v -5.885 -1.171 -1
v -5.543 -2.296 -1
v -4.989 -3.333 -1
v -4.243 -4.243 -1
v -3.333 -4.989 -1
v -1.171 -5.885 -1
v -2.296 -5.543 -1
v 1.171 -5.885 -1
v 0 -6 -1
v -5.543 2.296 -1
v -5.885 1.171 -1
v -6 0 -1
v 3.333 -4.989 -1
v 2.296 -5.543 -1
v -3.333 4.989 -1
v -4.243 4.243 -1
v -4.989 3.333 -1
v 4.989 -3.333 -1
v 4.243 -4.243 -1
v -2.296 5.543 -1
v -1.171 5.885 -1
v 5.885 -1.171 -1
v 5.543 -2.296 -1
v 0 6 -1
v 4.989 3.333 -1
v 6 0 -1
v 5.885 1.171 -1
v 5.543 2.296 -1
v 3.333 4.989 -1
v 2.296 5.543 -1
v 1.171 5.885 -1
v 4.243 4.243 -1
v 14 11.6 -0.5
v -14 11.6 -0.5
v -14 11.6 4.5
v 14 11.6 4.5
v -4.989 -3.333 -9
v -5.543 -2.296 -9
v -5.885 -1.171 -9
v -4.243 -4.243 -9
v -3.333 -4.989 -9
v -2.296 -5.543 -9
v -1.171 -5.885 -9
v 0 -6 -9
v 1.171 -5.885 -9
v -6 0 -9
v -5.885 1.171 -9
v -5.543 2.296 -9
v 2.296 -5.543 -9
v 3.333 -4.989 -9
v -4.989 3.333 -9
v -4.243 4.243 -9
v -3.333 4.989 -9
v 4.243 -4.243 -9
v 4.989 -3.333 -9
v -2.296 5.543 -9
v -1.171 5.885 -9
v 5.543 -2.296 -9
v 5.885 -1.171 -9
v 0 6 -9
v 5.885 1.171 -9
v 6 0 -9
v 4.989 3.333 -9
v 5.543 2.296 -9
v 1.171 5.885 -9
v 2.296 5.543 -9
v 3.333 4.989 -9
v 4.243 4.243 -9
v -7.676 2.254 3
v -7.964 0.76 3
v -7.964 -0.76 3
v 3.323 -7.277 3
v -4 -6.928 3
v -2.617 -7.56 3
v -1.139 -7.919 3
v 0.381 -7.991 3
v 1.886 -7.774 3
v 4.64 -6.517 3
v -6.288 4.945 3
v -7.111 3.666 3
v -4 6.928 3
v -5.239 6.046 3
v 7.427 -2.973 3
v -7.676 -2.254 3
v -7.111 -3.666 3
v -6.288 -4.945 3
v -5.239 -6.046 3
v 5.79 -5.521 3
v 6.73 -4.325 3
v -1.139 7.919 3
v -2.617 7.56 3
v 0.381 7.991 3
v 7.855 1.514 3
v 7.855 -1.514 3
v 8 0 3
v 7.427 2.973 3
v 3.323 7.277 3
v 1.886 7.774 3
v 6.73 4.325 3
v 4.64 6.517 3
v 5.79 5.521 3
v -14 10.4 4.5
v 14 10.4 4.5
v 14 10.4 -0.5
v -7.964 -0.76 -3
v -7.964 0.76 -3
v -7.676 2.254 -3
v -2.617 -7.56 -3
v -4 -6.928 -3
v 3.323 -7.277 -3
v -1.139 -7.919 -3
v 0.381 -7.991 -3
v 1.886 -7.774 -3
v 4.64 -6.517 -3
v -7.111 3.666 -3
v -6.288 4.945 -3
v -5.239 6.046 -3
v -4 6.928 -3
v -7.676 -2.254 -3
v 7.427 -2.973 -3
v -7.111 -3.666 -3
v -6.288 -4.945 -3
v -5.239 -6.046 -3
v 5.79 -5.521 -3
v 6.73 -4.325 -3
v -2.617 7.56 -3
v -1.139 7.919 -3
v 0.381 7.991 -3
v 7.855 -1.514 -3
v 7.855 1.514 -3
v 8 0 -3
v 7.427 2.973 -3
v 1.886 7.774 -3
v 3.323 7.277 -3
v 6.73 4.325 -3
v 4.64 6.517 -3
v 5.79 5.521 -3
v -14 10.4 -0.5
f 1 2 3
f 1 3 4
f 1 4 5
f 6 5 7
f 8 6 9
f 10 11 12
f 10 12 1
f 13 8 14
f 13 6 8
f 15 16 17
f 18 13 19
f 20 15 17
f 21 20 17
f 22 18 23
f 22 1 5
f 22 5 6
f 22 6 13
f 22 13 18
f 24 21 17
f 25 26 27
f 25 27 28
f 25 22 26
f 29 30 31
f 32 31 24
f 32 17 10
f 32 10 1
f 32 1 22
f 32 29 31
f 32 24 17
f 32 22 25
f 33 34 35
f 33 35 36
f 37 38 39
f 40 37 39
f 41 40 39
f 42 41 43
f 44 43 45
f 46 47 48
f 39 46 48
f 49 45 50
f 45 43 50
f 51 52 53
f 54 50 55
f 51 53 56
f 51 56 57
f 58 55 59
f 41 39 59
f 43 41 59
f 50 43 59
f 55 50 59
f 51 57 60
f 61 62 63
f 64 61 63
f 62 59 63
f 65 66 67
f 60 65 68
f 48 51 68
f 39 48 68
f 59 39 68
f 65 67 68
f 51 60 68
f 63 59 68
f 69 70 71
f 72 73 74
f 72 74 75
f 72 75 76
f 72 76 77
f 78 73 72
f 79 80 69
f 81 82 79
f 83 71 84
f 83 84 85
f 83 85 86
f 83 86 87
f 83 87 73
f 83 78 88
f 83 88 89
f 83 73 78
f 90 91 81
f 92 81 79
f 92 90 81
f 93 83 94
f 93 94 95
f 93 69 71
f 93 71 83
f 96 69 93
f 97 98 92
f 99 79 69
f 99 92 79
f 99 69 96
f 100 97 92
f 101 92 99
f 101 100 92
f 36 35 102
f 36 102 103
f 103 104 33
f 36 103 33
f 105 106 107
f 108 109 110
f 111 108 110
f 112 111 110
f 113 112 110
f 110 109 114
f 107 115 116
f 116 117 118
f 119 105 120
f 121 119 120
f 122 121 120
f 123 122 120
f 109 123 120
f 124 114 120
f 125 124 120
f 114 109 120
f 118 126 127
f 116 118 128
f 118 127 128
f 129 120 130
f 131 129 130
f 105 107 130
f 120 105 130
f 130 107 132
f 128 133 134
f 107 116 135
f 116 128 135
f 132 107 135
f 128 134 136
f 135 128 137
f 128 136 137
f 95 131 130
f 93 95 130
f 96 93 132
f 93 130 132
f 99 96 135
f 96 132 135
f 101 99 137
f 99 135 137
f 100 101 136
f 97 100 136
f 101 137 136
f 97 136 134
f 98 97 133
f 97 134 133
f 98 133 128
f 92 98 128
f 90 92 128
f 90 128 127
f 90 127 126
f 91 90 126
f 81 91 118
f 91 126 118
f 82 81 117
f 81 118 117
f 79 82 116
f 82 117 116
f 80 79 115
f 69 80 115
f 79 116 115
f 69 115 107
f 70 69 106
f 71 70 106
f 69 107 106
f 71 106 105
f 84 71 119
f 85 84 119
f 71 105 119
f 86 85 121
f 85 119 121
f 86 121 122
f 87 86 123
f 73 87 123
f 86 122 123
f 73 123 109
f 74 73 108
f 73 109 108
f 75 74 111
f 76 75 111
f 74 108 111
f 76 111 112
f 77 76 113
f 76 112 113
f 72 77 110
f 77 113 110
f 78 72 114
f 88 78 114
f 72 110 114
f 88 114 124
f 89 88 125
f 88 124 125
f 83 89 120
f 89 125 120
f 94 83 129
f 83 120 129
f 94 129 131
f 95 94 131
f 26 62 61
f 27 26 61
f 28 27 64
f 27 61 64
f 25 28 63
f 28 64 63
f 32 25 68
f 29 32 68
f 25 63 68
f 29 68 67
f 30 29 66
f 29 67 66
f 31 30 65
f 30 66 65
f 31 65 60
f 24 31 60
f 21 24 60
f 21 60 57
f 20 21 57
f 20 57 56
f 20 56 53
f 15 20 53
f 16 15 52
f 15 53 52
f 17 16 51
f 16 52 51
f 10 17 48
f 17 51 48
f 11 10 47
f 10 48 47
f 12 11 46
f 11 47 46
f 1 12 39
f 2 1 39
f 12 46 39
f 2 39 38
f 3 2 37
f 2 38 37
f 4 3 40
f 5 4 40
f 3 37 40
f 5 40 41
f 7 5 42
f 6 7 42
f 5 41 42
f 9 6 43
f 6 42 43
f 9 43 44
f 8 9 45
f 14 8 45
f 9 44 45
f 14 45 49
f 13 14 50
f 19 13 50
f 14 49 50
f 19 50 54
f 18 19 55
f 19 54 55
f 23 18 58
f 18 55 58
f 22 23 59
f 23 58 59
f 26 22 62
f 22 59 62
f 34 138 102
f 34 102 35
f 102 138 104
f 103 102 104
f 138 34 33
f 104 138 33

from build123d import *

# Parameters (mm, degrees)
TOP_START                                  = -3
SKETCH_1_R                                 = 8
TOP_WAKE_BUTTON_CAP_DIA_16_MM_DEPTH        = 6
BUTTON_START                               = -9
SKETCH_2_R                                 = 6
BUTTON_THREADED_BODY_HOLE_MARKER_DIA_DEPTH = 8
BUTTON_START_2                             = -0.5
SKETCH_3_W                                 = 28
SKETCH_3_H                                 = 1.2
BUTTON_LABEL_PLATE_WAKE_BTN_DEPTH          = 5


with BuildPart() as part:
    # 草图1 → top wake button cap - dia 16 mm (new body)
    with BuildSketch(Plane.XY.offset(TOP_START)):
        Circle(SKETCH_1_R)
    extrude(amount=TOP_WAKE_BUTTON_CAP_DIA_16_MM_DEPTH)


with BuildPart() as body_2:
    # 草图2 → button threaded body / hole marker - dia 12 mm (new body)
    with BuildSketch(Plane.XY.offset(BUTTON_START)):
        Circle(SKETCH_2_R)
    extrude(amount=BUTTON_THREADED_BODY_HOLE_MARKER_DIA_DEPTH)


with BuildPart() as body_3:
    # 草图3 → button label plate - WAKE BTN (new body)
    with BuildSketch(Plane.XY.offset(BUTTON_START_2)):
        with Locations((0, 11)):
            Rectangle(SKETCH_3_W, SKETCH_3_H)
    extrude(amount=BUTTON_LABEL_PLATE_WAKE_BTN_DEPTH)


solid = Compound([part.part, body_2.part, body_3.part])
